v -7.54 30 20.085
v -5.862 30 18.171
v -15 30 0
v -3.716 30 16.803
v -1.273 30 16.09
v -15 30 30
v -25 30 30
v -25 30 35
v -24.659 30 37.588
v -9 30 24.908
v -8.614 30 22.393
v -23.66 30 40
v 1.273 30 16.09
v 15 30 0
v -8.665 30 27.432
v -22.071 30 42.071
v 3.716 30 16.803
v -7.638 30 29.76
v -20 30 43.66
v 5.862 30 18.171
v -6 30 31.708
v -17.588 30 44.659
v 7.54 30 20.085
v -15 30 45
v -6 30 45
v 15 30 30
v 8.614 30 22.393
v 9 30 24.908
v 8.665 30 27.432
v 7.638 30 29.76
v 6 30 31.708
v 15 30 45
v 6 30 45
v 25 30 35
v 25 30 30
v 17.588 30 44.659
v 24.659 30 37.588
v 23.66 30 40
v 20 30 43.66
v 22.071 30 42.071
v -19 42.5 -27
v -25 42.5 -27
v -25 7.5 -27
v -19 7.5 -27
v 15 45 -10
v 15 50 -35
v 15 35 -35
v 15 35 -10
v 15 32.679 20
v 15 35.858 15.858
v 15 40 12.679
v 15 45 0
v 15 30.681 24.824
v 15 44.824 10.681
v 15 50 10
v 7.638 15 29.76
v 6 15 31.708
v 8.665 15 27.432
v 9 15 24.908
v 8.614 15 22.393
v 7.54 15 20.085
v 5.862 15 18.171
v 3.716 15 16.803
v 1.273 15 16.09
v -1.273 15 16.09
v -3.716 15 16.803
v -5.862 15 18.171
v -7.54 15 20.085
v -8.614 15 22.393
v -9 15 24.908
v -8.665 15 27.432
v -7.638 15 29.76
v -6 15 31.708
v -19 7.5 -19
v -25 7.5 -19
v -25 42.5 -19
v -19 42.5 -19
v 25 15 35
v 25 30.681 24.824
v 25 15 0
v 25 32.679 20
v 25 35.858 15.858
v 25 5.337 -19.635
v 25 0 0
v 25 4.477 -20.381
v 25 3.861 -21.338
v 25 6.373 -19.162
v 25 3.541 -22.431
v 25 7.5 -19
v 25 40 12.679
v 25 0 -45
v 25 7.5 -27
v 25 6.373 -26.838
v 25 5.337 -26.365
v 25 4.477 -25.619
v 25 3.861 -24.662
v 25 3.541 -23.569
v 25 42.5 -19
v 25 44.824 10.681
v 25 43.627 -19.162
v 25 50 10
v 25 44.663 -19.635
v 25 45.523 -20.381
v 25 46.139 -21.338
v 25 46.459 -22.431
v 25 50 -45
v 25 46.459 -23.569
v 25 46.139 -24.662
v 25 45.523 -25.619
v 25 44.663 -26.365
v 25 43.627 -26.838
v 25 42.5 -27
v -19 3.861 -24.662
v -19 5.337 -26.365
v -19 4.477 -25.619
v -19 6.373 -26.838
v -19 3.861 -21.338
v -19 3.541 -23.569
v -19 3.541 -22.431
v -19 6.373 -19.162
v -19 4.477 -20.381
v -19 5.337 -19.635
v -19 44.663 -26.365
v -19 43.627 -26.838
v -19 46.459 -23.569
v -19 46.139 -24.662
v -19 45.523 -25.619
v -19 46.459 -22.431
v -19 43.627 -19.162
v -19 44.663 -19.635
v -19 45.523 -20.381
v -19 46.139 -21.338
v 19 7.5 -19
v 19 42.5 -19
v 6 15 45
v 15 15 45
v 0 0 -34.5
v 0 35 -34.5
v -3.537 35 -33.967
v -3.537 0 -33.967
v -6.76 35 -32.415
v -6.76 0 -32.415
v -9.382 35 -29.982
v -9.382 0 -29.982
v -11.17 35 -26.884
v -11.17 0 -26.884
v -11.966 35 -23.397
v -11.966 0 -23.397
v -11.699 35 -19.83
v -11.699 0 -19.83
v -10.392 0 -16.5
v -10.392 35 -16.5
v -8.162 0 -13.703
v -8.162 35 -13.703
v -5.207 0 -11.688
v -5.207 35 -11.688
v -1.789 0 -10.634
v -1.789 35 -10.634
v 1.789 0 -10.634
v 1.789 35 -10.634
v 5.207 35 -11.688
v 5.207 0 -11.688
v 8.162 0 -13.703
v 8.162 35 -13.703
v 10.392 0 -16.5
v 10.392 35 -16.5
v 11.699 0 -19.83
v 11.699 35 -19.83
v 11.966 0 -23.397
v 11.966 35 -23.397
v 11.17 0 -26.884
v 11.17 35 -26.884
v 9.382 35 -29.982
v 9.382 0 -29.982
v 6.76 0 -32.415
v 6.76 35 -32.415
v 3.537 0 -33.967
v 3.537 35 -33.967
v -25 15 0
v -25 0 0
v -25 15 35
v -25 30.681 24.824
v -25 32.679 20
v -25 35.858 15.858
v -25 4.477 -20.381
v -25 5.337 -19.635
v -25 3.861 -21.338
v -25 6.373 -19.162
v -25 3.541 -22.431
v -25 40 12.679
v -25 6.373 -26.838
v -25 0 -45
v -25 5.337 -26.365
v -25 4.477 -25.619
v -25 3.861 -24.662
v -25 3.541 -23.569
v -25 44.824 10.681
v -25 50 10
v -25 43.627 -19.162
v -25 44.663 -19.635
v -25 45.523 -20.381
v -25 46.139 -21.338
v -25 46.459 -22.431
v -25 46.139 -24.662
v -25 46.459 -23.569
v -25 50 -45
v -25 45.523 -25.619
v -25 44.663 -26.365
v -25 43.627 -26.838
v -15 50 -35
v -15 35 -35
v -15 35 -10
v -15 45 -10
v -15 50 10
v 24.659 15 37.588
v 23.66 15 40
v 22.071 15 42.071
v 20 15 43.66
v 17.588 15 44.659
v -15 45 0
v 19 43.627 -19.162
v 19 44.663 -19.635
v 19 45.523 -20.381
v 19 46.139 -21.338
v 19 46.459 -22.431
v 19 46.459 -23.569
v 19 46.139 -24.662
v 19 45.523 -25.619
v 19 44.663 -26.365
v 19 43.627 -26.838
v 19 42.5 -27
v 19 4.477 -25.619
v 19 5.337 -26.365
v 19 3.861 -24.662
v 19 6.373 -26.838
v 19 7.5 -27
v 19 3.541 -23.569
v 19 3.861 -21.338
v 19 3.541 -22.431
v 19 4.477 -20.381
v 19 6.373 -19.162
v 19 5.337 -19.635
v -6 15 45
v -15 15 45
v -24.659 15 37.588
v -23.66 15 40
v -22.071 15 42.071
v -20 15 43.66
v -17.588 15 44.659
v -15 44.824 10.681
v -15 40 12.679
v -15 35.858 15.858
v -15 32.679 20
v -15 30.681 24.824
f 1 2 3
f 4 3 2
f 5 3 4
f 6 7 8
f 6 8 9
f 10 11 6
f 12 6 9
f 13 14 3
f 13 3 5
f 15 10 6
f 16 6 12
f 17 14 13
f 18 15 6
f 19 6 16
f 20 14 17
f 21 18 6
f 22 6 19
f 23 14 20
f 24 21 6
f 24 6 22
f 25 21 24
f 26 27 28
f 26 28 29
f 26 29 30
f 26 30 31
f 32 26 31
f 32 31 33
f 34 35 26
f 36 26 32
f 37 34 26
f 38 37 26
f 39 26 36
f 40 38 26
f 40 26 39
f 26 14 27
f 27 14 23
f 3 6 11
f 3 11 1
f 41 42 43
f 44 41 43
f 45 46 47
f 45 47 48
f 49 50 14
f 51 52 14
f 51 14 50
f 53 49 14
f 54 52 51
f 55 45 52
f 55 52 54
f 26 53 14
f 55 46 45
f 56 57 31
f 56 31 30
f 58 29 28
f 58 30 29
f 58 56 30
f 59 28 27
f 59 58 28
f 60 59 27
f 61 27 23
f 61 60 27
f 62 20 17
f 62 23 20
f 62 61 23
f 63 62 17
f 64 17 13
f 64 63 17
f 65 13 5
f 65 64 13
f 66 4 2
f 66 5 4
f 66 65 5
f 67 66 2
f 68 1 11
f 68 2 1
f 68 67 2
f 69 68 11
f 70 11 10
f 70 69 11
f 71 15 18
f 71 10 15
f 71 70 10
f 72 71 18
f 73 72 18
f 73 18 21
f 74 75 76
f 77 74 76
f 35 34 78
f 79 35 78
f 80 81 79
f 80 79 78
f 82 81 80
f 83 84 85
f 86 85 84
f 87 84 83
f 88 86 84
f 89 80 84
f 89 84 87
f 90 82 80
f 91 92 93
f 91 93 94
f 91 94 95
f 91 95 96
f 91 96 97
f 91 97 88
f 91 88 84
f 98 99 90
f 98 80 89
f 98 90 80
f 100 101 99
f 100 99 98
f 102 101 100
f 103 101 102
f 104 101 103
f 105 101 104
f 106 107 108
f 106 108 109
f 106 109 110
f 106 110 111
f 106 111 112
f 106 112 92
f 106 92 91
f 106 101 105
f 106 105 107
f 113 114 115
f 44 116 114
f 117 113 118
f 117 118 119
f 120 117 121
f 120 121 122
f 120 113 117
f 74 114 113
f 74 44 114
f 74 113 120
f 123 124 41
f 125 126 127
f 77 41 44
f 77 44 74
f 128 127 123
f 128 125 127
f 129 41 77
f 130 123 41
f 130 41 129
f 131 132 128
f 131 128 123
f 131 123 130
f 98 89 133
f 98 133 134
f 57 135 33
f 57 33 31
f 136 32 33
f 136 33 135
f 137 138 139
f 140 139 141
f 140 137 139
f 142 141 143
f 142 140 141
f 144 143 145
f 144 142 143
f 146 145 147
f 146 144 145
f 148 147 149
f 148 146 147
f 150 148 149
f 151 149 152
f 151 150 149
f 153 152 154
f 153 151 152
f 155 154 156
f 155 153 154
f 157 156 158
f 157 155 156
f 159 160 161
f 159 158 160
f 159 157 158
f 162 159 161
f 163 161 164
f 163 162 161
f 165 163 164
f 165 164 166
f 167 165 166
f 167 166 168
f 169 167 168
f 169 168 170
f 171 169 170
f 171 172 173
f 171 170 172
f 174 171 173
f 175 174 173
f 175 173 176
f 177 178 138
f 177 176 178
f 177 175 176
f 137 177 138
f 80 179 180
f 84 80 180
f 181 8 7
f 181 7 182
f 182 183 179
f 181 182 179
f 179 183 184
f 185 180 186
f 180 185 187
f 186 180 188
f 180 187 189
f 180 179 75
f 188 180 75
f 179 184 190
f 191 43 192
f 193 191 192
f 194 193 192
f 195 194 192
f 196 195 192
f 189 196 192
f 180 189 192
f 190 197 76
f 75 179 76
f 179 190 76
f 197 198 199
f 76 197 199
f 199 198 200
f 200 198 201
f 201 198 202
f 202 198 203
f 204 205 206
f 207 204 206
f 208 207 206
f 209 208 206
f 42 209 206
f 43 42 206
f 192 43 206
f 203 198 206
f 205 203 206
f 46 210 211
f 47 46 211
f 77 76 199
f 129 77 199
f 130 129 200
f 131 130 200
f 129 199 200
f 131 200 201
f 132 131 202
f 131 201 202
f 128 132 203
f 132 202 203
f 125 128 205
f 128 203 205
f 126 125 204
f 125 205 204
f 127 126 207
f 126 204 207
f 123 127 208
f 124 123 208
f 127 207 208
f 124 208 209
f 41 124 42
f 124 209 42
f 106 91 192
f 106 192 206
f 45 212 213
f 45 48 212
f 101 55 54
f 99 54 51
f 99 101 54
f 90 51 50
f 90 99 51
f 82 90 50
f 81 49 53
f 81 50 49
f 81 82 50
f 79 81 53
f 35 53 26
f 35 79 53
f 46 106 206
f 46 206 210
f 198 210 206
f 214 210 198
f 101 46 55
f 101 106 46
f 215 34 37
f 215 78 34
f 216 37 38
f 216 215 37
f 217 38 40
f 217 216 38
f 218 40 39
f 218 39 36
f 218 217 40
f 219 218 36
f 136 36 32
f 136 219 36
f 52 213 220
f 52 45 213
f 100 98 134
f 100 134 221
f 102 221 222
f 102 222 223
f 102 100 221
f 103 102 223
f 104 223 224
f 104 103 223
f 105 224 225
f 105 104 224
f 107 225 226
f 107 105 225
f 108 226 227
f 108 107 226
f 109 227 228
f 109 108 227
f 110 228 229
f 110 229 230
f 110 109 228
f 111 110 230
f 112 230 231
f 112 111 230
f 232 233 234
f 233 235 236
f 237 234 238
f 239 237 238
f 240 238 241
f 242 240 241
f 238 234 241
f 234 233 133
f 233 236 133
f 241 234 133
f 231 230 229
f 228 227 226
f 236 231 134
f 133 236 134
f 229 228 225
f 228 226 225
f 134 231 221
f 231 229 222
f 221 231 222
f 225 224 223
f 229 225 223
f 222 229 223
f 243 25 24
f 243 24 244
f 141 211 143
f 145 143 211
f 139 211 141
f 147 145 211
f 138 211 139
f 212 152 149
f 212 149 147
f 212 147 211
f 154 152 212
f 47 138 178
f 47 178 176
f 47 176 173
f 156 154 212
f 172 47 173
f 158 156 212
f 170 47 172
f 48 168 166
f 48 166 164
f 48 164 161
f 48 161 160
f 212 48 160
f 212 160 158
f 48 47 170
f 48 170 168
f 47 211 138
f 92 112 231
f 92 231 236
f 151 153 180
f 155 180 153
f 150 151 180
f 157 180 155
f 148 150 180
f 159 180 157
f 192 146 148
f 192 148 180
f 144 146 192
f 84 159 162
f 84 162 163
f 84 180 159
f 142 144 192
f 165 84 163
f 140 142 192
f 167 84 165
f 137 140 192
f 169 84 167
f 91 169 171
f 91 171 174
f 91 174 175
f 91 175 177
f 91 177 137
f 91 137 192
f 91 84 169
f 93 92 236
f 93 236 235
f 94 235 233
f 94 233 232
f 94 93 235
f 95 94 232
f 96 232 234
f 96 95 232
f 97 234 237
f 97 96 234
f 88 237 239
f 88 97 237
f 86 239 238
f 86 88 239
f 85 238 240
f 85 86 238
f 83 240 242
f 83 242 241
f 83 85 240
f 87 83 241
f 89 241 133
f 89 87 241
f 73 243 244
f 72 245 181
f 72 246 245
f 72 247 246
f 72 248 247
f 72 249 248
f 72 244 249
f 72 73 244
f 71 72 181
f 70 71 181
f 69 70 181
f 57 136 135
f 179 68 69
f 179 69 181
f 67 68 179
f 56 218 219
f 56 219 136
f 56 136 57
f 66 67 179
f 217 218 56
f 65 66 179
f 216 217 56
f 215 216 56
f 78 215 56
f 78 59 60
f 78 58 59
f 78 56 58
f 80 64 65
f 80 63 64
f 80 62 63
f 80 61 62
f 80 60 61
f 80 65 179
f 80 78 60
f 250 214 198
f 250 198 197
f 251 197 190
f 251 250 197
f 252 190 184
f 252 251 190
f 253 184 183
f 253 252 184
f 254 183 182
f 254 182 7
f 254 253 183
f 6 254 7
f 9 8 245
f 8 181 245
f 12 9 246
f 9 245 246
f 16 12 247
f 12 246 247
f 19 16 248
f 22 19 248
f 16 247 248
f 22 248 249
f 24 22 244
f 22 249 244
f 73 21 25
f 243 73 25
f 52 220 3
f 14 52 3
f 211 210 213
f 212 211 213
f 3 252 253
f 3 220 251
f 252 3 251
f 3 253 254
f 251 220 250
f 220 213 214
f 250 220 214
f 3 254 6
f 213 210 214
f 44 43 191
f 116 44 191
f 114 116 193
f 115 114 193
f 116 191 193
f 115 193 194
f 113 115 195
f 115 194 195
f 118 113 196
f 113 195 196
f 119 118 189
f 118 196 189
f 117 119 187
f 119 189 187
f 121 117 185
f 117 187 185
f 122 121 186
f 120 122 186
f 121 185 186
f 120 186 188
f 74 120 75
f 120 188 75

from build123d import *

# Parameters (mm, degrees)
BOSS_EXTRUDE3_DEPTH = 25
CUT_EXTRUDE3_DEPTH  = 15
SKETCH9_R           = 12
SKETCH9_R_2         = 9
CUT_EXTRUDE4_DEPTH  = 72.763500472
CUT_EXTRUDE5_DEPTH  = 6
FILLET2_R           = 10


with BuildPart() as part:
    # Sketch6 → Boss-Extrude3 (new, symmetric)
    with BuildSketch(Plane(origin=(0, 0, 0), x_dir=(0, 0, -1), z_dir=(1, 0, 0))):
        with BuildLine():
            Line((0, 0), (45, 0))
            Line((45, 0), (45, 50))
            Line((45, 50), (-10, 50))
            ThreePointArc((-10, 50), (-15.857864376, 35.857864376), (-30, 30))
            Line((-30, 30), (-45, 30))
            Line((-45, 30), (-45, 15))
            Line((-45, 15), (0, 15))
            Line((0, 15), (0, 0))
        make_face()
    extrude(amount=BOSS_EXTRUDE3_DEPTH, both=True)

    # Sketch8 → Cut-Extrude3 (cut, symmetric)
    with BuildSketch(Plane(origin=(0, 0, 0), x_dir=(0, 0, -1), z_dir=(1, 0, 0))):
        with BuildLine():
            Line((35, 50), (35, 35))
            Line((35, 35), (10, 35))
            Line((10, 35), (10, 45))
            Line((10, 45), (0, 45))
            Line((0, 45), (0, 30))
            Line((0, 30), (-30, 30))
            ThreePointArc((-30, 30), (-15.857864376, 35.857864376), (-10, 50))
            Line((-10, 50), (35, 50))
        make_face()
    extrude(amount=CUT_EXTRUDE3_DEPTH, both=True, mode=Mode.SUBTRACT)

    # Sketch9 → Cut-Extrude4 (cut, through all)
    with BuildSketch(Plane(origin=(0, 0, 0), x_dir=(1, 0, 0), z_dir=(0, 1, 0))):
        with Locations(Location((0, 22.5, 0), (0, 0, 90))):
            Circle(SKETCH9_R)
        with Locations((0, -25)):
            Circle(SKETCH9_R_2)
        with BuildLine():
            ThreePointArc((6, -31.708203932), (0, -34), (-6, -31.708203932))
            Line((-6, -31.708203932), (-6, -45))
            Line((-6, -45), (6, -45))
            Line((6, -45), (6, -31.708203932))
        make_face()
    extrude(amount=CUT_EXTRUDE4_DEPTH, mode=Mode.SUBTRACT)

    # Sketch14 → Cut-Extrude5 (cut)
    with BuildSketch(Plane(origin=(25, 0, 0), x_dir=(0, 0, -1), z_dir=(1, 0, 0))):
        with BuildLine():
            Line((27, 42.5), (27, 7.5))
            ThreePointArc((27, 7.5), (23, 3.5), (19, 7.5))
            Line((19, 7.5), (19, 42.5))
            ThreePointArc((19, 42.5), (23, 46.5), (27, 42.5))
        make_face()
    cut_extrude5 = extrude(amount=-CUT_EXTRUDE5_DEPTH, mode=Mode.SUBTRACT)

    # Mirror1: Cut-Extrude5 across plane
    add(cut_extrude5.mirror(Plane(origin=(0, 0, 0), x_dir=(0, 0, 1), z_dir=(1, 0, 0))), mode=Mode.SUBTRACT)

    # Fillet2
    fillet2_edges = [part.edges().sort_by_distance(p)[0] for p in [
        (25, 22.5, 45),
        (-25, 22.5, 45),
    ]]
    fillet(fillet2_edges, radius=FILLET2_R)


solid = part.part
